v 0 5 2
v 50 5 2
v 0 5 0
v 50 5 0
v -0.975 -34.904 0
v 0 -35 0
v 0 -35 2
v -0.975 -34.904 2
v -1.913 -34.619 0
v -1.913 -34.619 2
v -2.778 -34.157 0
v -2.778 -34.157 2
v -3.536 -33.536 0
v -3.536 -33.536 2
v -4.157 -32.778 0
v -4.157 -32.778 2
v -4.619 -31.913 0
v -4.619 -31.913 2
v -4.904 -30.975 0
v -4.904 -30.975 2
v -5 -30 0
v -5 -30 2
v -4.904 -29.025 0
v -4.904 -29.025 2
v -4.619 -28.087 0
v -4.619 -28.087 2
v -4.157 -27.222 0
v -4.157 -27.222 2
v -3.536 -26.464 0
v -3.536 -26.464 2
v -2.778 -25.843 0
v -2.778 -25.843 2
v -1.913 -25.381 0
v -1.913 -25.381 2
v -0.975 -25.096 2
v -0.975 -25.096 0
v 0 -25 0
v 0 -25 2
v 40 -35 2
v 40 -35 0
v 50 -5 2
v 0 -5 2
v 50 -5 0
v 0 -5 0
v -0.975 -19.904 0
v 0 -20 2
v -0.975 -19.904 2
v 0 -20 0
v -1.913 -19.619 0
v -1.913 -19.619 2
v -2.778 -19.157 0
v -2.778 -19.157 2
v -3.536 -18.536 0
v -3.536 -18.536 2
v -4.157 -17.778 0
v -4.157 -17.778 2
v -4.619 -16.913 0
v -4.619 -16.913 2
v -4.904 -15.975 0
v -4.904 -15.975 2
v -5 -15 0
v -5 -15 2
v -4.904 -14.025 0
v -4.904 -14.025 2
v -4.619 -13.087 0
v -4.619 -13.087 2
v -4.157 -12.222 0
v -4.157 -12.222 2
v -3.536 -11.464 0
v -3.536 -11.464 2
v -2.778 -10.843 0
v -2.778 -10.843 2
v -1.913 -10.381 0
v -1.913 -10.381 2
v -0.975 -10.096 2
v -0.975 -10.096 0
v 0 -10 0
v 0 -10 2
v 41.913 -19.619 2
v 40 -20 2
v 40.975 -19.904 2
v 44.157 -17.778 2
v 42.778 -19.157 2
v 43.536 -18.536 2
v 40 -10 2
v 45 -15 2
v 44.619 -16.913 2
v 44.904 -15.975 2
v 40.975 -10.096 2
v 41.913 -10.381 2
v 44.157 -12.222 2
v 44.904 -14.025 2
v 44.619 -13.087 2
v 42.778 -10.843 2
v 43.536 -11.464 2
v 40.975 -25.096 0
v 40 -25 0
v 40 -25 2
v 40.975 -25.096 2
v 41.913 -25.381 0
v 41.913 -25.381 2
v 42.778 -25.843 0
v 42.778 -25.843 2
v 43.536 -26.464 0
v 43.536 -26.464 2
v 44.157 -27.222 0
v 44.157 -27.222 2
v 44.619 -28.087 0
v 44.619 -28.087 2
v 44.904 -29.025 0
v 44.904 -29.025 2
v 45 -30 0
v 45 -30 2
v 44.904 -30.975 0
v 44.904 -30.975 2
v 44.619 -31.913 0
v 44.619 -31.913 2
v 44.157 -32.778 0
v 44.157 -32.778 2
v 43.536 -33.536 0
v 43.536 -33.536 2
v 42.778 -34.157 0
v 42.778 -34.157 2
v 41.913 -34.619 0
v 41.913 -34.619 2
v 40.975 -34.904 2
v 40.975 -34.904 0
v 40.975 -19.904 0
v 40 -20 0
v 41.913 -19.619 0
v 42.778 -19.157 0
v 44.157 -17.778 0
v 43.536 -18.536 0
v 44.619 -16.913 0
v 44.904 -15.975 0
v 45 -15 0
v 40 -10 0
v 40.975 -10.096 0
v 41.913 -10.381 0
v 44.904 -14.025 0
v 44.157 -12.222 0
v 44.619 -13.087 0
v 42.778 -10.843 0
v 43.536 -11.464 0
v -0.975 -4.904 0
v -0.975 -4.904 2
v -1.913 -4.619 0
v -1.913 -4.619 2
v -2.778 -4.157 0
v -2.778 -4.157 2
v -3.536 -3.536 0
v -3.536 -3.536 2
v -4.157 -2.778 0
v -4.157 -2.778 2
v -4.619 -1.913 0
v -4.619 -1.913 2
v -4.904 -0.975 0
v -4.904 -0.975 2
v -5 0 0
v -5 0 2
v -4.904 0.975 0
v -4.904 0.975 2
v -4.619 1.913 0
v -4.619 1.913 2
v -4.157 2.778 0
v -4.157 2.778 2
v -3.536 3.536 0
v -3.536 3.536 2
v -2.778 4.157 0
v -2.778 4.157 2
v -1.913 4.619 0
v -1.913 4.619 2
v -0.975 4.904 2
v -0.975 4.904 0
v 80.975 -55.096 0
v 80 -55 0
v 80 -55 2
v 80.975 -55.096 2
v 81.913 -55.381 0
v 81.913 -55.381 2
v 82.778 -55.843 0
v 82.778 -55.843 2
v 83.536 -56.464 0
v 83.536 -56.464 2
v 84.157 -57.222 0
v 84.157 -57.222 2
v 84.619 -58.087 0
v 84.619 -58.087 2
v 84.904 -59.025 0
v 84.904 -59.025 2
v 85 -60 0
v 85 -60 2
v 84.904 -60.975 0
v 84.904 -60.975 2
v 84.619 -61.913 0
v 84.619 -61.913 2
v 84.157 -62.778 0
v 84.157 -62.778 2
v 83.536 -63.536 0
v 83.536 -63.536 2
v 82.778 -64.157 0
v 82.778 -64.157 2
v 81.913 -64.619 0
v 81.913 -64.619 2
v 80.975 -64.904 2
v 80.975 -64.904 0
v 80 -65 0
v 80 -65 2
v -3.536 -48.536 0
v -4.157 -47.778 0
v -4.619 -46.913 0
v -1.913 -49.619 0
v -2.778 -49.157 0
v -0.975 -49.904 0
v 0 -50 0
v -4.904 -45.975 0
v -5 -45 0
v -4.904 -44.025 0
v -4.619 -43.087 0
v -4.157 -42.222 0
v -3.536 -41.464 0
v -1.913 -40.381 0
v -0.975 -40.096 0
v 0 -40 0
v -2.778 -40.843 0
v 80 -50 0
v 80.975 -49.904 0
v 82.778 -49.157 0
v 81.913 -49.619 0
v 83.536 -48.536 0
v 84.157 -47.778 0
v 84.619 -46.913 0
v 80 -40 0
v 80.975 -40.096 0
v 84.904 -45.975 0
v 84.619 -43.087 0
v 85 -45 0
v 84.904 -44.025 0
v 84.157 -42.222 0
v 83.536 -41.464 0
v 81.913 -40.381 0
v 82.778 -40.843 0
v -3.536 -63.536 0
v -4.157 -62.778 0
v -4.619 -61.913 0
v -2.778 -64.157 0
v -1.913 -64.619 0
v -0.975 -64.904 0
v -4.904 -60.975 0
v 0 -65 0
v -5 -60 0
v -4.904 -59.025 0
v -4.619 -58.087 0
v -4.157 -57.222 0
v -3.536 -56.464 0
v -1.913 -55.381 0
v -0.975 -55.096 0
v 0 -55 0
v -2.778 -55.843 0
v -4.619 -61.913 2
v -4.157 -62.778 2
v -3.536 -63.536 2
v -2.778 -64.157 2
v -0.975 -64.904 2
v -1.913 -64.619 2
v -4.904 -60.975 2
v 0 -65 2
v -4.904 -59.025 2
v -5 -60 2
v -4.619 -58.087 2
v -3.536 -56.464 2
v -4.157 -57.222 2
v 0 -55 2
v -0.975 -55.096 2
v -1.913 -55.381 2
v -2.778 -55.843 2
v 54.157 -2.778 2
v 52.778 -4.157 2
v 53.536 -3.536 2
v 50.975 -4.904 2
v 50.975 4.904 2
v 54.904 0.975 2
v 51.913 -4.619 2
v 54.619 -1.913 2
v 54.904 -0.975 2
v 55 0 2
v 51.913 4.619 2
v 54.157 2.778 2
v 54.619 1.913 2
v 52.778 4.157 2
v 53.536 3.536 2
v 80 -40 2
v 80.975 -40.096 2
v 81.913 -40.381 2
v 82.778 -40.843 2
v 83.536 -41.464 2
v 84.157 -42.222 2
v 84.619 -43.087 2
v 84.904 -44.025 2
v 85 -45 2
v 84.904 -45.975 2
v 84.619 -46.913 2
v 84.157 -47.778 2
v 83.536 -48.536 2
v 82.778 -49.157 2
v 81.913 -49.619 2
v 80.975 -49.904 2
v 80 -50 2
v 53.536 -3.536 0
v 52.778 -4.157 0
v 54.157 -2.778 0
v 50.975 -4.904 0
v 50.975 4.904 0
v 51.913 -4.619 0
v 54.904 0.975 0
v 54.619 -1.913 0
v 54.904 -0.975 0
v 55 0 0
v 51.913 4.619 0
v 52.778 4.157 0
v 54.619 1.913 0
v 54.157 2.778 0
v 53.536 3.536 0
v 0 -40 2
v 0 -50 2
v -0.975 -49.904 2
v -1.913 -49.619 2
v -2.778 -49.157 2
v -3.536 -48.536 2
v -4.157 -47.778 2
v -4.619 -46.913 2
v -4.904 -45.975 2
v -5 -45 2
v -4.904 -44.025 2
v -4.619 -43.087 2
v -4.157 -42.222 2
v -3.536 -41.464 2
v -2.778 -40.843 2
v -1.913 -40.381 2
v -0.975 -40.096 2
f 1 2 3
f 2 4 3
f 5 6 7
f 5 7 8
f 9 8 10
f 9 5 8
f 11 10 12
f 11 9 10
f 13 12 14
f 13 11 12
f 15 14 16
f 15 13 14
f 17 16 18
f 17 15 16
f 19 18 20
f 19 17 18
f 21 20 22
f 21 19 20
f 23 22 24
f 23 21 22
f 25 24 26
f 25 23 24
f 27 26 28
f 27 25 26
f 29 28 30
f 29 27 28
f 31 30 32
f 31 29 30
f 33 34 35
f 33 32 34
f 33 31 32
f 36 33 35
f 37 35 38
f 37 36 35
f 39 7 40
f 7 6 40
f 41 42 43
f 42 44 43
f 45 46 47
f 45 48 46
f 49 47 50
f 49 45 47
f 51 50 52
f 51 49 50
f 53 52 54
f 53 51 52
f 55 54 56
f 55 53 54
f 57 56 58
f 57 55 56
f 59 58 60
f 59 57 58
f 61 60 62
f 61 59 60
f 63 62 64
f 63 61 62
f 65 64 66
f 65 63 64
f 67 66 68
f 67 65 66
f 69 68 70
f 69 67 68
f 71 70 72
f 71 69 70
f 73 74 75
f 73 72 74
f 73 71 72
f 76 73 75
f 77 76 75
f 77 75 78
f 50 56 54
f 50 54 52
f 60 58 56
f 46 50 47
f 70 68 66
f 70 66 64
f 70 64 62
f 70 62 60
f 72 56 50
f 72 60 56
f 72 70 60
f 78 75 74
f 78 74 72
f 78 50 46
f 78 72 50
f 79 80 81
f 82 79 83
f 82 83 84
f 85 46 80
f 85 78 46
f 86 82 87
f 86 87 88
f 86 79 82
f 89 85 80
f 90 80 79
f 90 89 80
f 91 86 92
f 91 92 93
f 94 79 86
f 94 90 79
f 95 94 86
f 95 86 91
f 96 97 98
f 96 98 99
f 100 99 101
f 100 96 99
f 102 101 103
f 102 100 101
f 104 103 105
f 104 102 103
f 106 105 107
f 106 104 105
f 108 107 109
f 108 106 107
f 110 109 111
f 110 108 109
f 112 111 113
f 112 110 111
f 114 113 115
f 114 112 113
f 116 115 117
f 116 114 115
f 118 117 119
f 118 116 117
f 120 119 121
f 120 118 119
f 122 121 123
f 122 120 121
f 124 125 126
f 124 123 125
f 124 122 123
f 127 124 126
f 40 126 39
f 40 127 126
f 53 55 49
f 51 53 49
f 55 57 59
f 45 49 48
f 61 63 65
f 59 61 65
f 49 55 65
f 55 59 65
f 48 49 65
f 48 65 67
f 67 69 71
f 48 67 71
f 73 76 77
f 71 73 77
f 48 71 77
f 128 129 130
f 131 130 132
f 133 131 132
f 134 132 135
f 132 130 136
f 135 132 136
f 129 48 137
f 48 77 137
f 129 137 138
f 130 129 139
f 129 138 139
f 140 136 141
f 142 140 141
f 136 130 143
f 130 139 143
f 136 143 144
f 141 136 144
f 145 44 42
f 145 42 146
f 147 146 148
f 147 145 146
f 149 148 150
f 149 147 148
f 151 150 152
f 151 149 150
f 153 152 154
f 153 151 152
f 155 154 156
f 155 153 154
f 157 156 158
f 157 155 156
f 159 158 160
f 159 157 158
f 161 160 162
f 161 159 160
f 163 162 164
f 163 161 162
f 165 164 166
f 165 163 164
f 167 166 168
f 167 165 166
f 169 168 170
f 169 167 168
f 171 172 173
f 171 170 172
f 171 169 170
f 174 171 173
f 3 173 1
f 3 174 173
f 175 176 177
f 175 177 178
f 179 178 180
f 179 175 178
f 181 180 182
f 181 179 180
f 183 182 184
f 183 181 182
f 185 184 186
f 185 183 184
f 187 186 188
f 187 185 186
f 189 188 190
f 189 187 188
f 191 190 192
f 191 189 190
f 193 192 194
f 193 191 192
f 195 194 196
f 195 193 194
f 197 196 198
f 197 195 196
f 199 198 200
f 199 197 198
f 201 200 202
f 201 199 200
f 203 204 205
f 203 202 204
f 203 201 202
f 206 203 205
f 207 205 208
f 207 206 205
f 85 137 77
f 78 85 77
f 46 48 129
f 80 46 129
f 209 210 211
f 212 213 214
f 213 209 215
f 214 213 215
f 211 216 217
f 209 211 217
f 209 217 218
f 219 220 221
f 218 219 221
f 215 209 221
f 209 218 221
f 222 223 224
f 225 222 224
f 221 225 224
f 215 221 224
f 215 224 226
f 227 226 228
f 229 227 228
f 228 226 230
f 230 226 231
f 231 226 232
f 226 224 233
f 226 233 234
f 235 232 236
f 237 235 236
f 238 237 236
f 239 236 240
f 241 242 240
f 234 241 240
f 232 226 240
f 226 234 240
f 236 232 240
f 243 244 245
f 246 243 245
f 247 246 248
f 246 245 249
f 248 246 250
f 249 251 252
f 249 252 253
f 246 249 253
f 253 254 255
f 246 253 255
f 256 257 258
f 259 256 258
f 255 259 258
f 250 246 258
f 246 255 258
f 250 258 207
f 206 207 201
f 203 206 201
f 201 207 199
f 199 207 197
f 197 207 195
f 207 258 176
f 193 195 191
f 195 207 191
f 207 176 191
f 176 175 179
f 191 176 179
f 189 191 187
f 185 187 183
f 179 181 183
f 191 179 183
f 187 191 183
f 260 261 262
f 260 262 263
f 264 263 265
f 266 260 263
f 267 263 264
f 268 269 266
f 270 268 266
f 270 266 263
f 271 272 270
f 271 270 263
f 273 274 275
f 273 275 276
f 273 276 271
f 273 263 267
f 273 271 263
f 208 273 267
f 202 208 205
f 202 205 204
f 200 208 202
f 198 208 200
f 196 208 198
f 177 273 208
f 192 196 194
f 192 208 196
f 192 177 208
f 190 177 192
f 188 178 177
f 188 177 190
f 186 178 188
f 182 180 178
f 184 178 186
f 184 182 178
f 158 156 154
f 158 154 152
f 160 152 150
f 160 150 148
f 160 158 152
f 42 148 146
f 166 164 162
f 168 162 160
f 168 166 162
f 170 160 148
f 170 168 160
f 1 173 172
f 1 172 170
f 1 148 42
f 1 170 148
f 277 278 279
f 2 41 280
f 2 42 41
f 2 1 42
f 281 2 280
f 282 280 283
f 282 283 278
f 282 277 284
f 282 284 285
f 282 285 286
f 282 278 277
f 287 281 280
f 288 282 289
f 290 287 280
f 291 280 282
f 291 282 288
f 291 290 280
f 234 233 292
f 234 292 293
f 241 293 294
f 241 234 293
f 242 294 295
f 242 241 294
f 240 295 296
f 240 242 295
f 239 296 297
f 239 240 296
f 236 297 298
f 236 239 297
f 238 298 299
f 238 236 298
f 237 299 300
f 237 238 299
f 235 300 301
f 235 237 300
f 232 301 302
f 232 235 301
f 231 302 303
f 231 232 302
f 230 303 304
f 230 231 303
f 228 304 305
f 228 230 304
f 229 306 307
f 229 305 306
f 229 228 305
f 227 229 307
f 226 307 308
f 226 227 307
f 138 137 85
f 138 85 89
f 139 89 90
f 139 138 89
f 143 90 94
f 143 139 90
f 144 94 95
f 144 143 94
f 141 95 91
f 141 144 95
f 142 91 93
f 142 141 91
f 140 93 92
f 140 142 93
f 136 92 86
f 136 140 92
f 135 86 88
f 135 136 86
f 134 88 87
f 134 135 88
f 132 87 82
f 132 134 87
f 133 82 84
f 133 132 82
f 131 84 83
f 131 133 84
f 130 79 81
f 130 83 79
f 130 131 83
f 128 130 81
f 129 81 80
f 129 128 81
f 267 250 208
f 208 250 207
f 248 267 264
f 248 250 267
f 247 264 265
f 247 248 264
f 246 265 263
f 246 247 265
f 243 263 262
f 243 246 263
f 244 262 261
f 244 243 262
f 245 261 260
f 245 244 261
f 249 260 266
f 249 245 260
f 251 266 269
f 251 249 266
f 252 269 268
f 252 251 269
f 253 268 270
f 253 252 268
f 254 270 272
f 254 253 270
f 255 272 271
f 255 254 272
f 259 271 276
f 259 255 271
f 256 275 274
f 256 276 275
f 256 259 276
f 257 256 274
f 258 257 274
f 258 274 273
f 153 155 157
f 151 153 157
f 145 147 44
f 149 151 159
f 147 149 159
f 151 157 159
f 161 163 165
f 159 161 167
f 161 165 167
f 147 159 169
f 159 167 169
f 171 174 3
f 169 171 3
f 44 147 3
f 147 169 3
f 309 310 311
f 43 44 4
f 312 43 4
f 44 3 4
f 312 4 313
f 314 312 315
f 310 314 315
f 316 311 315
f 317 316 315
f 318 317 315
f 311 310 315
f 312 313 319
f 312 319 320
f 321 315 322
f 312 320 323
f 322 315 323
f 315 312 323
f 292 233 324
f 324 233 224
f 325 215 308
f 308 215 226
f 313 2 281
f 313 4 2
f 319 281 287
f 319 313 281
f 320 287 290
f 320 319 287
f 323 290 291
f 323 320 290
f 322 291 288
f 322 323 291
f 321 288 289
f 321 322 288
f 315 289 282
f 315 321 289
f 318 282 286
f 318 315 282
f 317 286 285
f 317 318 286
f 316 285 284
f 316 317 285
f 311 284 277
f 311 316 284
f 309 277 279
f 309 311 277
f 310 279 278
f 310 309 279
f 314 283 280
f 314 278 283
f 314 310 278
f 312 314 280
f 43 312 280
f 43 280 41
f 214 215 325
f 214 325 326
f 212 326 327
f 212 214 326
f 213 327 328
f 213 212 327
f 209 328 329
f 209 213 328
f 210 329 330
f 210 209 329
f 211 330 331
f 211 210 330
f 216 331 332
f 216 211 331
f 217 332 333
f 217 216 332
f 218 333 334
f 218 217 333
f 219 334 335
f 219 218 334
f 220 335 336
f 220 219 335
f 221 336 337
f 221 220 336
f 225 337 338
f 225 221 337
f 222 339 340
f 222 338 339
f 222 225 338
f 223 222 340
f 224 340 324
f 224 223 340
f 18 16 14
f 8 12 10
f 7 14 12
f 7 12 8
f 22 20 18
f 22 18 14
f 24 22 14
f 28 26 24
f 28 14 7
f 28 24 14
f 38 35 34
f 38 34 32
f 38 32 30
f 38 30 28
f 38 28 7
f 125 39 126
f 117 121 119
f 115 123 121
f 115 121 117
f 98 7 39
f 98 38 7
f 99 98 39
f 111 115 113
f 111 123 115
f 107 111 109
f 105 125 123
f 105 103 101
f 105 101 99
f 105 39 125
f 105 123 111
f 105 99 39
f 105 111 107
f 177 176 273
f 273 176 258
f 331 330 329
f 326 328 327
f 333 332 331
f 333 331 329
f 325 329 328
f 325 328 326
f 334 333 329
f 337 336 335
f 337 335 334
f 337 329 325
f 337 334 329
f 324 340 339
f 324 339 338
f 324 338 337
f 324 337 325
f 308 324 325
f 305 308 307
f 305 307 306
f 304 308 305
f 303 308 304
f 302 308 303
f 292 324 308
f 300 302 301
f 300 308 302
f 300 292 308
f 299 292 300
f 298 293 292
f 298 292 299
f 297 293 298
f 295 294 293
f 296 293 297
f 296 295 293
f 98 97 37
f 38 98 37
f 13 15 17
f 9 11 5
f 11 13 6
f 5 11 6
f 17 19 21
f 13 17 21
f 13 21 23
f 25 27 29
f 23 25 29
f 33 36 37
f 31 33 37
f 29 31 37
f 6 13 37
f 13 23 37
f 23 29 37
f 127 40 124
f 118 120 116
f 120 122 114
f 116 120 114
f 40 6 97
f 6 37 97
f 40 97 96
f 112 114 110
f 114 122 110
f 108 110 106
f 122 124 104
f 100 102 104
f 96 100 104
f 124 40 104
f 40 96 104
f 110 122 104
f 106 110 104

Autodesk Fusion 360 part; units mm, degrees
sketch "Sketch1" plane through (0, 0, 0) normal (0, 0, 1) x (1, 0, 0)
  line L0 (0, -5) -> (50, -5)
  arc A0 (50, -5) -> (50, 5) centre (50, 0) ccw
  line L1 (50, 5) -> (0, 5)
  arc A1 (0, 5) -> (0, -5) centre (0, 0) ccw
  line L2 (0, 0) -> (50, 0) construction
  line L3 (0, -20) -> (40, -20)
  arc A2 (40, -20) -> (40, -10) centre (40, -15) ccw
  line L4 (40, -10) -> (0, -10)
  arc A3 (0, -10) -> (0, -20) centre (0, -15) ccw
  line L5 (0, -15) -> (40, -15) construction
  line L6 (0, -35) -> (40, -35)
  arc A4 (40, -35) -> (40, -25) centre (40, -30) ccw
  line L7 (40, -25) -> (0, -25)
  arc A5 (0, -25) -> (0, -35) centre (0, -30) ccw
  line L8 (0, -30) -> (40, -30) construction
  line L9 (0, -50) -> (80, -50)
  arc A6 (80, -50) -> (80, -40) centre (80, -45) ccw
  line L10 (80, -40) -> (0, -40)
  arc A7 (0, -40) -> (0, -50) centre (0, -45) ccw
  line L11 (0, -45) -> (80, -45) construction
  line L12 (0, -65) -> (80, -65)
  arc A8 (80, -65) -> (80, -55) centre (80, -60) ccw
  line L13 (80, -55) -> (0, -55)
  arc A9 (0, -55) -> (0, -65) centre (0, -60) ccw
  line L14 (0, -60) -> (80, -60) construction
  dimension "d75" = 50
  dimension "d76" = 5
  dimension "d77" = 80
  dimension "d78" = 40
extrude "Extrude1" add sketch "Sketch1" along normal blind 2 makes body 1 at (26.6667, -31.6667, 0) makes body 2 at (26.6667, -16.6667, 0) makes body 3 at (53.3333, -46.6667, 0) makes body 4 at (33.3333, -1.6667, 0) makes body 5 at (53.3333, -61.6667, 0) in component "Component"
copy_body "Body->Comp1" bodies 1 removing the originals makes body 6 in component "Component'"
copy_body "Body->Comp2" bodies 2 removing the originals makes body 7 in component "Component''"
copy_body "Body->Comp3" bodies 3 removing the originals makes body 8 in component "Component'''"
copy_body "Body->Comp4" bodies 4 removing the originals makes body 9 in component "Component''''"
copy_body "Body->Comp5" bodies 5 removing the originals makes body 10 in component "Component'''''"
component "Component" placed x (1, 0, 0) y (0, 1, 0) z (0, 0, 1) at (0, 0, 0)
component "Component'" placed x (1, 0, 0) y (0, 1, 0) z (0, 0, 1) at (0, 0, 0) in component "Component"
component "Component''" placed x (1, 0, 0) y (0, 1, 0) z (0, 0, 1) at (0, 0, 0) in component "Component"
component "Component'''" placed x (1, 0, 0) y (0, 1, 0) z (0, 0, 1) at (0, 0, 0) in component "Component"
component "Component''''" placed x (1, 0, 0) y (0, 1, 0) z (0, 0, 1) at (0, 0, 0) in component "Component"
component "Component'''''" placed x (1, 0, 0) y (0, 1, 0) z (0, 0, 1) at (0, 0, 0) in component "Component"
